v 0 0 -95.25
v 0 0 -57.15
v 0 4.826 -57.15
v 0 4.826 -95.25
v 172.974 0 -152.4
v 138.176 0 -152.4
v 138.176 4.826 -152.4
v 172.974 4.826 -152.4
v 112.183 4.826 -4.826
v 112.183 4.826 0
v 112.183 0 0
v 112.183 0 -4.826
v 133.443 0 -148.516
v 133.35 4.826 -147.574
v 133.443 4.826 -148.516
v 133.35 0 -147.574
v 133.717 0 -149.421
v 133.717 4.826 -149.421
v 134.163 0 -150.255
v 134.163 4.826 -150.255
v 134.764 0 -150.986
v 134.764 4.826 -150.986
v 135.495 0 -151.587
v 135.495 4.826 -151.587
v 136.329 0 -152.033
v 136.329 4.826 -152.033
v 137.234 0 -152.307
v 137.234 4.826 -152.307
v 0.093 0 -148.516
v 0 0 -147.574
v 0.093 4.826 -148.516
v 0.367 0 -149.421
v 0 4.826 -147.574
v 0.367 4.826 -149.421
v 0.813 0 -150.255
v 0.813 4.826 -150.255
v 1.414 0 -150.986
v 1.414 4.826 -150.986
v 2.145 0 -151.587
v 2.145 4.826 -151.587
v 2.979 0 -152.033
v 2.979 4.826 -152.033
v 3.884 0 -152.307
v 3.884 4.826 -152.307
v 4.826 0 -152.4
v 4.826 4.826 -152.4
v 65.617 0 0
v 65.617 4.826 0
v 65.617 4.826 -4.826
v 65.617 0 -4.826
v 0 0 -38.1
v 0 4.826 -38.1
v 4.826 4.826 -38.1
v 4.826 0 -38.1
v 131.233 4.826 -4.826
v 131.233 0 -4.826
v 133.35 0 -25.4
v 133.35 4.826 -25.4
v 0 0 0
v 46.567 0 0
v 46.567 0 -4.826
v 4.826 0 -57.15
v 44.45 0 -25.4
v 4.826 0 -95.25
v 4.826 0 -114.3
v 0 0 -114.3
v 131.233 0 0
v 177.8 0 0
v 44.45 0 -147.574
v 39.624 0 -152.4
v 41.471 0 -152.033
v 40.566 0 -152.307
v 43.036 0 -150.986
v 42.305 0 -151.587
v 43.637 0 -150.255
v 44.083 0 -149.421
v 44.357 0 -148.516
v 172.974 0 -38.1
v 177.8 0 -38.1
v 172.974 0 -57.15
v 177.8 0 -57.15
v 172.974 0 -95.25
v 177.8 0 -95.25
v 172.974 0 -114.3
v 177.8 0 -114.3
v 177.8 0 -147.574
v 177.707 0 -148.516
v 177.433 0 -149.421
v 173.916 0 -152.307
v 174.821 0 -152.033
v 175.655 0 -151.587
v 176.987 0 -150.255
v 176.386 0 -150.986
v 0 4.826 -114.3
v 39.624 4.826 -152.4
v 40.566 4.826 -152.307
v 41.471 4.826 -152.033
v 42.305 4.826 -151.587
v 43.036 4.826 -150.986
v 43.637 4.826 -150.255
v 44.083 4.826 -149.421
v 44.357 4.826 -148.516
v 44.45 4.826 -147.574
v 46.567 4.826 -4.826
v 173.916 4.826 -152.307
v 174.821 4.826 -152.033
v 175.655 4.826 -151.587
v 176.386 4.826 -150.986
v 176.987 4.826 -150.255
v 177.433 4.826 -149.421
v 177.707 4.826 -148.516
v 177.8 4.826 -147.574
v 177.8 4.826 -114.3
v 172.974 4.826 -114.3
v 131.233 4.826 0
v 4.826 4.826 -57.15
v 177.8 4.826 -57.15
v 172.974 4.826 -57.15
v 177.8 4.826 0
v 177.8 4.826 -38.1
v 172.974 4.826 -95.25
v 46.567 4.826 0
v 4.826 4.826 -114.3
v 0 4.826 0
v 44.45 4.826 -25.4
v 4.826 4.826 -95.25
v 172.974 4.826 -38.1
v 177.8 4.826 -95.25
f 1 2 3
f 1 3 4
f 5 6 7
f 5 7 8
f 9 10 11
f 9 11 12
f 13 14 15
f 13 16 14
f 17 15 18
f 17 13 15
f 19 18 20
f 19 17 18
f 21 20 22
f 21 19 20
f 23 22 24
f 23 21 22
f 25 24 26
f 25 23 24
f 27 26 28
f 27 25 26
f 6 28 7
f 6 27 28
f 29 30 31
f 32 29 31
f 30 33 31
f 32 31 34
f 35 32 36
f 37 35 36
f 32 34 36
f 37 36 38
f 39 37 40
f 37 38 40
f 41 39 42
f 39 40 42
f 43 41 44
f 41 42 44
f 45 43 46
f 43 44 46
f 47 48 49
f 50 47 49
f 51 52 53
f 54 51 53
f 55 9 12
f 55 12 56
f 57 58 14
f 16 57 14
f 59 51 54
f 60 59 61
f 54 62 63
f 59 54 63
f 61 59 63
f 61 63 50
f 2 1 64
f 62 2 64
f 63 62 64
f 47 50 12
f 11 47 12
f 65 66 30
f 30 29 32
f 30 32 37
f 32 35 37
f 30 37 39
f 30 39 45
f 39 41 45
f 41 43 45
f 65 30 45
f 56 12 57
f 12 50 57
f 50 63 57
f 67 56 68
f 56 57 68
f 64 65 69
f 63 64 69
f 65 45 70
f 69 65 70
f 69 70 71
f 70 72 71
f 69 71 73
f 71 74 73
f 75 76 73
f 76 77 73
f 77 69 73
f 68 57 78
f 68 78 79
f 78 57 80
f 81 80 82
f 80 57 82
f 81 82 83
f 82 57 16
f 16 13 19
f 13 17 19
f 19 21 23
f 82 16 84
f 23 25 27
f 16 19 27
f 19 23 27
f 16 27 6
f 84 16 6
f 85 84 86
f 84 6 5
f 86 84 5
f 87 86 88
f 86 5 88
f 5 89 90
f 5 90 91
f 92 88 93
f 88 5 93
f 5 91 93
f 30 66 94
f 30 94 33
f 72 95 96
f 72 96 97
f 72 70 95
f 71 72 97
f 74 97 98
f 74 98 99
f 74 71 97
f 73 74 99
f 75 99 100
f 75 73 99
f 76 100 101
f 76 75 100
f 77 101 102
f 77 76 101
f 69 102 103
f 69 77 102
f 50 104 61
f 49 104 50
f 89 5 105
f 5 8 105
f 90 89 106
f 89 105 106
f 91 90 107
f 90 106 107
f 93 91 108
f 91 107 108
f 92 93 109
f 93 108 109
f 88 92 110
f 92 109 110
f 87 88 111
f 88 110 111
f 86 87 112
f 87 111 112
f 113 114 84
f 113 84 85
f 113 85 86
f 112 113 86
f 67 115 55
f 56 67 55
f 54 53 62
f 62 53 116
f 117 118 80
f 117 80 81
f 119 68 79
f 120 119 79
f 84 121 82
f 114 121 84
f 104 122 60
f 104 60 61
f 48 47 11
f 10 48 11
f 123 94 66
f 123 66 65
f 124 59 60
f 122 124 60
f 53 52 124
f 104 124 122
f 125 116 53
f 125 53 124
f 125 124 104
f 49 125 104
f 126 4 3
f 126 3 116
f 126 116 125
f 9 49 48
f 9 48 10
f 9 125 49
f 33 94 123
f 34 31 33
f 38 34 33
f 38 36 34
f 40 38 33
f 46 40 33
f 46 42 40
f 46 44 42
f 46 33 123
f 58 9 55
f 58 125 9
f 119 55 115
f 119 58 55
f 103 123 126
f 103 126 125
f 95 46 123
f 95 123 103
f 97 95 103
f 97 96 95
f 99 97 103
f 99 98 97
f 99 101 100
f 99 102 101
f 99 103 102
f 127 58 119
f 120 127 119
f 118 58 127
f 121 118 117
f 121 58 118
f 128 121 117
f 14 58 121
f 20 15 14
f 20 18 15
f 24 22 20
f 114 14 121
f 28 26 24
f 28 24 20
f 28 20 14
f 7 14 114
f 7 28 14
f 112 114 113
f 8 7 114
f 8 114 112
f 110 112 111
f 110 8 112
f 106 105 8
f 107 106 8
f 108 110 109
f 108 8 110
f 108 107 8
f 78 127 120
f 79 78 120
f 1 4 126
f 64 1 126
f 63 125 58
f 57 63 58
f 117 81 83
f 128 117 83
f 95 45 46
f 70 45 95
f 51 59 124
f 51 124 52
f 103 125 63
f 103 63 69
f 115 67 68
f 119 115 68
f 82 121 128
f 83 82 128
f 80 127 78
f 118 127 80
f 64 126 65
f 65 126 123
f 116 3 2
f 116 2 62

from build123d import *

# Parameters (mm, degrees)
SKETCH1_W             = 177.8
SKETCH1_H             = 152.4
BOSS_EXTRUDE1_DEPTH   = 4.826
SKETCH2_W             = 88.9
SKETCH2_H             = 127
CENTER_CUTOUT_DEPTH   = 235.22615199
SKETCH3_W             = 19.05
SKETCH3_H             = 4.826
BACK_EDGE_SLOTS_DEPTH = 235.22615199
SKETCH5_W             = 4.826
SKETCH5_H             = 19.05
SIDE_EDGE_SLOTS_DEPTH = 235.22615199
LEADING_EDGE_FILLET_R = 4.826


with BuildPart() as part:
    # Sketch1 → Boss-Extrude1 (new body)
    with BuildSketch(Plane(origin=(0, 0, 0), x_dir=(1, 0, 0), z_dir=(0, 1, 0))):
        with Locations((88.9, 76.2)):
            Rectangle(SKETCH1_W, SKETCH1_H)
    extrude(amount=BOSS_EXTRUDE1_DEPTH)

    # Sketch2 → Center Cutout (cut, through all)
    with BuildSketch(Plane(origin=(0, 4.826, 0), x_dir=(1, 0, 0), z_dir=(0, 1, 0))):
        with Locations((88.9, 88.9)):
            Rectangle(SKETCH2_W, SKETCH2_H)
    extrude(amount=-CENTER_CUTOUT_DEPTH, mode=Mode.SUBTRACT)

    # Sketch3 → Back Edge Slots (cut, through all)
    with BuildSketch(Plane(origin=(0, 4.826, 0), x_dir=(1, 0, 0), z_dir=(0, 1, 0))):
        with Locations((56.091666667, 2.413)):
            Rectangle(SKETCH3_W, SKETCH3_H)
        with Locations((121.708333333, 2.413)):
            Rectangle(SKETCH3_W, SKETCH3_H)
    extrude(amount=-BACK_EDGE_SLOTS_DEPTH, mode=Mode.SUBTRACT)

    # Sketch5 → Side Edge Slots (cut, through all)
    with BuildSketch(Plane(origin=(0, 4.826, 0), x_dir=(1, 0, 0), z_dir=(0, 1, 0))):
        with Locations((2.413, 104.775)):
            Rectangle(SKETCH5_W, SKETCH5_H)
        with Locations((2.413, 47.625)):
            Rectangle(SKETCH5_W, SKETCH5_H)
        with Locations((175.387, 104.775)):
            Rectangle(SKETCH5_W, SKETCH5_H)
        with Locations((175.387, 47.625)):
            Rectangle(SKETCH5_W, SKETCH5_H)
    extrude(amount=-SIDE_EDGE_SLOTS_DEPTH, mode=Mode.SUBTRACT)

    # Leading Edge Fillet
    leading_edge_fillet_edges = [part.edges().sort_by_distance(p)[0] for p in [
        (44.45, 2.413, -152.4),
        (133.35, 2.413, -152.4),
        (0, 2.413, -152.4),
        (177.8, 2.413, -152.4),
    ]]
    fillet(leading_edge_fillet_edges, radius=LEADING_EDGE_FILLET_R)


solid = part.part
